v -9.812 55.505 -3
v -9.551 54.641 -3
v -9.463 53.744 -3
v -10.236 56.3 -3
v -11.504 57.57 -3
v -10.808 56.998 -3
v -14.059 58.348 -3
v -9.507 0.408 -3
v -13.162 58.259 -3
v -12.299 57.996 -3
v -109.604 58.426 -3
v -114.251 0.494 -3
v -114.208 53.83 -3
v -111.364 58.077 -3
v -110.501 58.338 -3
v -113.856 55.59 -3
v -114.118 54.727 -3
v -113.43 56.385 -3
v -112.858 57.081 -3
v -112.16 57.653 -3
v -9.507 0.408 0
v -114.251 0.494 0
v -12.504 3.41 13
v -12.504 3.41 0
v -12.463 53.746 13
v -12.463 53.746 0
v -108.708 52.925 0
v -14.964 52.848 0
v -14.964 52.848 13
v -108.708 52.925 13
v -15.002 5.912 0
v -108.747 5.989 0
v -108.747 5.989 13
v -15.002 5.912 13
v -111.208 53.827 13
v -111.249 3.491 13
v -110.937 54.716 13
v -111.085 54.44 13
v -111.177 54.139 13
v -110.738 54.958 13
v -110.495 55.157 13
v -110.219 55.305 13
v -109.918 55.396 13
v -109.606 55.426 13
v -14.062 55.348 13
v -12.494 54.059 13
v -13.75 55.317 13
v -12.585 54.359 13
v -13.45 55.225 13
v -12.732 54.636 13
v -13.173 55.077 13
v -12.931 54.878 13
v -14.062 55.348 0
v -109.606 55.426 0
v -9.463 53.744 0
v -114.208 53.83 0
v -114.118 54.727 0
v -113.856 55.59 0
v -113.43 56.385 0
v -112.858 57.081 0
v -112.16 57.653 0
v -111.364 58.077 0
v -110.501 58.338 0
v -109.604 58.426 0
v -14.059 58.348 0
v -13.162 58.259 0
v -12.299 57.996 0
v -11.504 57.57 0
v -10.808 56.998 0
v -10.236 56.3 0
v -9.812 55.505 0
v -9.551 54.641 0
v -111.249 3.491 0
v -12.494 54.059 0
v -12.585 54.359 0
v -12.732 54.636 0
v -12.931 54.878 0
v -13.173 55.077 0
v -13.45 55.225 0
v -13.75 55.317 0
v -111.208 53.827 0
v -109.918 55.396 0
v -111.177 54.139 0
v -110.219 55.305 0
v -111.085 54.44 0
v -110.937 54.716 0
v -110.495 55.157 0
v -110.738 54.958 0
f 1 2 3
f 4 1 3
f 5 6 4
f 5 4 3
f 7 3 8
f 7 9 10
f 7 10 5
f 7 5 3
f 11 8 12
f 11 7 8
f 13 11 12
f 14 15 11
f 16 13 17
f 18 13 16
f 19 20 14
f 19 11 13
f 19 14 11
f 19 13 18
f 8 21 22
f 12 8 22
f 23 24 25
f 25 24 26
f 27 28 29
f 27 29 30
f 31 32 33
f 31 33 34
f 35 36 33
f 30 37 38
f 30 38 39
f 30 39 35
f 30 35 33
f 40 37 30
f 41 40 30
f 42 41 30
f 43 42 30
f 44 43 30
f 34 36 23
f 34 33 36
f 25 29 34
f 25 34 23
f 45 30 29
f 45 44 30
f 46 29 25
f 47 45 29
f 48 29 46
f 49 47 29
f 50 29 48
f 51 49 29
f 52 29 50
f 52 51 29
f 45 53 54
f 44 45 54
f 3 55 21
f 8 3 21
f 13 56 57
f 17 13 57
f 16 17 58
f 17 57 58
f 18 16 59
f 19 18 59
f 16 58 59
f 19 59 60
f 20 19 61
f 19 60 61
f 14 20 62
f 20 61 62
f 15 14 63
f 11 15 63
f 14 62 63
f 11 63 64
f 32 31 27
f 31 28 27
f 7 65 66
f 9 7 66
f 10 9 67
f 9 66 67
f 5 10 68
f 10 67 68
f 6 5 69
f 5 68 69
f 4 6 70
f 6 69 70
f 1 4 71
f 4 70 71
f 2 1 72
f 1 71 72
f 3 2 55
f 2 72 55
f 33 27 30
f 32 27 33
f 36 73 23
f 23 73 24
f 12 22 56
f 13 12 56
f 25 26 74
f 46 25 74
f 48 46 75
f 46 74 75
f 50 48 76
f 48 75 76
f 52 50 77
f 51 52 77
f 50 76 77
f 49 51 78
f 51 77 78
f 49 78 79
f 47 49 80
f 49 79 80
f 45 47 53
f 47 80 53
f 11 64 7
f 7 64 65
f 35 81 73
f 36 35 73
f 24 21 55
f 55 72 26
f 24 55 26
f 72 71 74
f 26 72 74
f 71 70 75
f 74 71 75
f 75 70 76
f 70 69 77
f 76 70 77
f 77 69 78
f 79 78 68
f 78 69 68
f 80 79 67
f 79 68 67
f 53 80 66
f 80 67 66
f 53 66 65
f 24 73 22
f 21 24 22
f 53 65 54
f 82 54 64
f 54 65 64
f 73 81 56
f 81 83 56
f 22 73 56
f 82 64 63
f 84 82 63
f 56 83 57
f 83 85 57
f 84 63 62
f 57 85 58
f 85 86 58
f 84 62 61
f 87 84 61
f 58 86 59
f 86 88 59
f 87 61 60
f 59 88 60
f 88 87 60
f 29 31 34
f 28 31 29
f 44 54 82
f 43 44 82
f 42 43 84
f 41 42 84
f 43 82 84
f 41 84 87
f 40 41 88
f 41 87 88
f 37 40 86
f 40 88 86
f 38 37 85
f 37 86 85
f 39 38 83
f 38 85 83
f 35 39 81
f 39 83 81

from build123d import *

# Parameters (mm, degrees)
RESSALTO_EXTRUS_O1_DEPTH = 13
RESSALTO_EXTRUS_O2_DEPTH = 3


with BuildPart() as part:
    # Esboço1 → Ressalto-extrusão1 (new body)
    with BuildSketch(Plane.XY):
        with BuildLine():
            Line((-111.248828562, 3.491171507), (-12.504488884, 3.410248792))
            Line((-12.504488884, 3.410248792), (-12.46323751, 53.746420916))
            ThreePointArc((-12.46323751, 53.746420916), (-12.930939325, 54.878175435), (-14.061925745, 55.347731606))
            Line((-14.061925745, 55.347731606), (-109.606266497, 55.426031866))
            ThreePointArc((-109.606266497, 55.426031866), (-110.738021017, 54.958330051), (-111.207577187, 53.82734363))
            Line((-111.207577187, 53.82734363), (-111.248828562, 3.491171507))
        make_face()
        Polygon((-108.746780608, 5.989121875), (-15.002439252, 5.912296746), (-14.963974236, 52.848470011), (-108.708315592, 52.92529514), align=None, mode=Mode.SUBTRACT)
    extrude(amount=RESSALTO_EXTRUS_O1_DEPTH)

    # Esboço2 → Ressalto-extrusão2 (add)
    with BuildSketch(Plane(origin=(0, 0, 0), x_dir=(-1, 0, 0), z_dir=(0, 0, -1))):
        with BuildLine():
            Line((9.463238518, 53.743962364), (9.506948443, 0.407791248))
            Line((9.506948443, 0.407791248), (114.251286106, 0.493631066))
            Line((114.251286106, 0.493631066), (114.20757618, 53.829802182))
            ThreePointArc((114.20757618, 53.829802182), (112.857602189, 57.081388141), (109.603807945, 58.426030858))
            Line((109.603807945, 58.426030858), (14.059467194, 58.347730599))
            ThreePointArc((14.059467194, 58.347730599), (10.807881235, 56.997756608), (9.463238518, 53.743962364))
        make_face()
    extrude(amount=RESSALTO_EXTRUS_O2_DEPTH)


solid = part.part
